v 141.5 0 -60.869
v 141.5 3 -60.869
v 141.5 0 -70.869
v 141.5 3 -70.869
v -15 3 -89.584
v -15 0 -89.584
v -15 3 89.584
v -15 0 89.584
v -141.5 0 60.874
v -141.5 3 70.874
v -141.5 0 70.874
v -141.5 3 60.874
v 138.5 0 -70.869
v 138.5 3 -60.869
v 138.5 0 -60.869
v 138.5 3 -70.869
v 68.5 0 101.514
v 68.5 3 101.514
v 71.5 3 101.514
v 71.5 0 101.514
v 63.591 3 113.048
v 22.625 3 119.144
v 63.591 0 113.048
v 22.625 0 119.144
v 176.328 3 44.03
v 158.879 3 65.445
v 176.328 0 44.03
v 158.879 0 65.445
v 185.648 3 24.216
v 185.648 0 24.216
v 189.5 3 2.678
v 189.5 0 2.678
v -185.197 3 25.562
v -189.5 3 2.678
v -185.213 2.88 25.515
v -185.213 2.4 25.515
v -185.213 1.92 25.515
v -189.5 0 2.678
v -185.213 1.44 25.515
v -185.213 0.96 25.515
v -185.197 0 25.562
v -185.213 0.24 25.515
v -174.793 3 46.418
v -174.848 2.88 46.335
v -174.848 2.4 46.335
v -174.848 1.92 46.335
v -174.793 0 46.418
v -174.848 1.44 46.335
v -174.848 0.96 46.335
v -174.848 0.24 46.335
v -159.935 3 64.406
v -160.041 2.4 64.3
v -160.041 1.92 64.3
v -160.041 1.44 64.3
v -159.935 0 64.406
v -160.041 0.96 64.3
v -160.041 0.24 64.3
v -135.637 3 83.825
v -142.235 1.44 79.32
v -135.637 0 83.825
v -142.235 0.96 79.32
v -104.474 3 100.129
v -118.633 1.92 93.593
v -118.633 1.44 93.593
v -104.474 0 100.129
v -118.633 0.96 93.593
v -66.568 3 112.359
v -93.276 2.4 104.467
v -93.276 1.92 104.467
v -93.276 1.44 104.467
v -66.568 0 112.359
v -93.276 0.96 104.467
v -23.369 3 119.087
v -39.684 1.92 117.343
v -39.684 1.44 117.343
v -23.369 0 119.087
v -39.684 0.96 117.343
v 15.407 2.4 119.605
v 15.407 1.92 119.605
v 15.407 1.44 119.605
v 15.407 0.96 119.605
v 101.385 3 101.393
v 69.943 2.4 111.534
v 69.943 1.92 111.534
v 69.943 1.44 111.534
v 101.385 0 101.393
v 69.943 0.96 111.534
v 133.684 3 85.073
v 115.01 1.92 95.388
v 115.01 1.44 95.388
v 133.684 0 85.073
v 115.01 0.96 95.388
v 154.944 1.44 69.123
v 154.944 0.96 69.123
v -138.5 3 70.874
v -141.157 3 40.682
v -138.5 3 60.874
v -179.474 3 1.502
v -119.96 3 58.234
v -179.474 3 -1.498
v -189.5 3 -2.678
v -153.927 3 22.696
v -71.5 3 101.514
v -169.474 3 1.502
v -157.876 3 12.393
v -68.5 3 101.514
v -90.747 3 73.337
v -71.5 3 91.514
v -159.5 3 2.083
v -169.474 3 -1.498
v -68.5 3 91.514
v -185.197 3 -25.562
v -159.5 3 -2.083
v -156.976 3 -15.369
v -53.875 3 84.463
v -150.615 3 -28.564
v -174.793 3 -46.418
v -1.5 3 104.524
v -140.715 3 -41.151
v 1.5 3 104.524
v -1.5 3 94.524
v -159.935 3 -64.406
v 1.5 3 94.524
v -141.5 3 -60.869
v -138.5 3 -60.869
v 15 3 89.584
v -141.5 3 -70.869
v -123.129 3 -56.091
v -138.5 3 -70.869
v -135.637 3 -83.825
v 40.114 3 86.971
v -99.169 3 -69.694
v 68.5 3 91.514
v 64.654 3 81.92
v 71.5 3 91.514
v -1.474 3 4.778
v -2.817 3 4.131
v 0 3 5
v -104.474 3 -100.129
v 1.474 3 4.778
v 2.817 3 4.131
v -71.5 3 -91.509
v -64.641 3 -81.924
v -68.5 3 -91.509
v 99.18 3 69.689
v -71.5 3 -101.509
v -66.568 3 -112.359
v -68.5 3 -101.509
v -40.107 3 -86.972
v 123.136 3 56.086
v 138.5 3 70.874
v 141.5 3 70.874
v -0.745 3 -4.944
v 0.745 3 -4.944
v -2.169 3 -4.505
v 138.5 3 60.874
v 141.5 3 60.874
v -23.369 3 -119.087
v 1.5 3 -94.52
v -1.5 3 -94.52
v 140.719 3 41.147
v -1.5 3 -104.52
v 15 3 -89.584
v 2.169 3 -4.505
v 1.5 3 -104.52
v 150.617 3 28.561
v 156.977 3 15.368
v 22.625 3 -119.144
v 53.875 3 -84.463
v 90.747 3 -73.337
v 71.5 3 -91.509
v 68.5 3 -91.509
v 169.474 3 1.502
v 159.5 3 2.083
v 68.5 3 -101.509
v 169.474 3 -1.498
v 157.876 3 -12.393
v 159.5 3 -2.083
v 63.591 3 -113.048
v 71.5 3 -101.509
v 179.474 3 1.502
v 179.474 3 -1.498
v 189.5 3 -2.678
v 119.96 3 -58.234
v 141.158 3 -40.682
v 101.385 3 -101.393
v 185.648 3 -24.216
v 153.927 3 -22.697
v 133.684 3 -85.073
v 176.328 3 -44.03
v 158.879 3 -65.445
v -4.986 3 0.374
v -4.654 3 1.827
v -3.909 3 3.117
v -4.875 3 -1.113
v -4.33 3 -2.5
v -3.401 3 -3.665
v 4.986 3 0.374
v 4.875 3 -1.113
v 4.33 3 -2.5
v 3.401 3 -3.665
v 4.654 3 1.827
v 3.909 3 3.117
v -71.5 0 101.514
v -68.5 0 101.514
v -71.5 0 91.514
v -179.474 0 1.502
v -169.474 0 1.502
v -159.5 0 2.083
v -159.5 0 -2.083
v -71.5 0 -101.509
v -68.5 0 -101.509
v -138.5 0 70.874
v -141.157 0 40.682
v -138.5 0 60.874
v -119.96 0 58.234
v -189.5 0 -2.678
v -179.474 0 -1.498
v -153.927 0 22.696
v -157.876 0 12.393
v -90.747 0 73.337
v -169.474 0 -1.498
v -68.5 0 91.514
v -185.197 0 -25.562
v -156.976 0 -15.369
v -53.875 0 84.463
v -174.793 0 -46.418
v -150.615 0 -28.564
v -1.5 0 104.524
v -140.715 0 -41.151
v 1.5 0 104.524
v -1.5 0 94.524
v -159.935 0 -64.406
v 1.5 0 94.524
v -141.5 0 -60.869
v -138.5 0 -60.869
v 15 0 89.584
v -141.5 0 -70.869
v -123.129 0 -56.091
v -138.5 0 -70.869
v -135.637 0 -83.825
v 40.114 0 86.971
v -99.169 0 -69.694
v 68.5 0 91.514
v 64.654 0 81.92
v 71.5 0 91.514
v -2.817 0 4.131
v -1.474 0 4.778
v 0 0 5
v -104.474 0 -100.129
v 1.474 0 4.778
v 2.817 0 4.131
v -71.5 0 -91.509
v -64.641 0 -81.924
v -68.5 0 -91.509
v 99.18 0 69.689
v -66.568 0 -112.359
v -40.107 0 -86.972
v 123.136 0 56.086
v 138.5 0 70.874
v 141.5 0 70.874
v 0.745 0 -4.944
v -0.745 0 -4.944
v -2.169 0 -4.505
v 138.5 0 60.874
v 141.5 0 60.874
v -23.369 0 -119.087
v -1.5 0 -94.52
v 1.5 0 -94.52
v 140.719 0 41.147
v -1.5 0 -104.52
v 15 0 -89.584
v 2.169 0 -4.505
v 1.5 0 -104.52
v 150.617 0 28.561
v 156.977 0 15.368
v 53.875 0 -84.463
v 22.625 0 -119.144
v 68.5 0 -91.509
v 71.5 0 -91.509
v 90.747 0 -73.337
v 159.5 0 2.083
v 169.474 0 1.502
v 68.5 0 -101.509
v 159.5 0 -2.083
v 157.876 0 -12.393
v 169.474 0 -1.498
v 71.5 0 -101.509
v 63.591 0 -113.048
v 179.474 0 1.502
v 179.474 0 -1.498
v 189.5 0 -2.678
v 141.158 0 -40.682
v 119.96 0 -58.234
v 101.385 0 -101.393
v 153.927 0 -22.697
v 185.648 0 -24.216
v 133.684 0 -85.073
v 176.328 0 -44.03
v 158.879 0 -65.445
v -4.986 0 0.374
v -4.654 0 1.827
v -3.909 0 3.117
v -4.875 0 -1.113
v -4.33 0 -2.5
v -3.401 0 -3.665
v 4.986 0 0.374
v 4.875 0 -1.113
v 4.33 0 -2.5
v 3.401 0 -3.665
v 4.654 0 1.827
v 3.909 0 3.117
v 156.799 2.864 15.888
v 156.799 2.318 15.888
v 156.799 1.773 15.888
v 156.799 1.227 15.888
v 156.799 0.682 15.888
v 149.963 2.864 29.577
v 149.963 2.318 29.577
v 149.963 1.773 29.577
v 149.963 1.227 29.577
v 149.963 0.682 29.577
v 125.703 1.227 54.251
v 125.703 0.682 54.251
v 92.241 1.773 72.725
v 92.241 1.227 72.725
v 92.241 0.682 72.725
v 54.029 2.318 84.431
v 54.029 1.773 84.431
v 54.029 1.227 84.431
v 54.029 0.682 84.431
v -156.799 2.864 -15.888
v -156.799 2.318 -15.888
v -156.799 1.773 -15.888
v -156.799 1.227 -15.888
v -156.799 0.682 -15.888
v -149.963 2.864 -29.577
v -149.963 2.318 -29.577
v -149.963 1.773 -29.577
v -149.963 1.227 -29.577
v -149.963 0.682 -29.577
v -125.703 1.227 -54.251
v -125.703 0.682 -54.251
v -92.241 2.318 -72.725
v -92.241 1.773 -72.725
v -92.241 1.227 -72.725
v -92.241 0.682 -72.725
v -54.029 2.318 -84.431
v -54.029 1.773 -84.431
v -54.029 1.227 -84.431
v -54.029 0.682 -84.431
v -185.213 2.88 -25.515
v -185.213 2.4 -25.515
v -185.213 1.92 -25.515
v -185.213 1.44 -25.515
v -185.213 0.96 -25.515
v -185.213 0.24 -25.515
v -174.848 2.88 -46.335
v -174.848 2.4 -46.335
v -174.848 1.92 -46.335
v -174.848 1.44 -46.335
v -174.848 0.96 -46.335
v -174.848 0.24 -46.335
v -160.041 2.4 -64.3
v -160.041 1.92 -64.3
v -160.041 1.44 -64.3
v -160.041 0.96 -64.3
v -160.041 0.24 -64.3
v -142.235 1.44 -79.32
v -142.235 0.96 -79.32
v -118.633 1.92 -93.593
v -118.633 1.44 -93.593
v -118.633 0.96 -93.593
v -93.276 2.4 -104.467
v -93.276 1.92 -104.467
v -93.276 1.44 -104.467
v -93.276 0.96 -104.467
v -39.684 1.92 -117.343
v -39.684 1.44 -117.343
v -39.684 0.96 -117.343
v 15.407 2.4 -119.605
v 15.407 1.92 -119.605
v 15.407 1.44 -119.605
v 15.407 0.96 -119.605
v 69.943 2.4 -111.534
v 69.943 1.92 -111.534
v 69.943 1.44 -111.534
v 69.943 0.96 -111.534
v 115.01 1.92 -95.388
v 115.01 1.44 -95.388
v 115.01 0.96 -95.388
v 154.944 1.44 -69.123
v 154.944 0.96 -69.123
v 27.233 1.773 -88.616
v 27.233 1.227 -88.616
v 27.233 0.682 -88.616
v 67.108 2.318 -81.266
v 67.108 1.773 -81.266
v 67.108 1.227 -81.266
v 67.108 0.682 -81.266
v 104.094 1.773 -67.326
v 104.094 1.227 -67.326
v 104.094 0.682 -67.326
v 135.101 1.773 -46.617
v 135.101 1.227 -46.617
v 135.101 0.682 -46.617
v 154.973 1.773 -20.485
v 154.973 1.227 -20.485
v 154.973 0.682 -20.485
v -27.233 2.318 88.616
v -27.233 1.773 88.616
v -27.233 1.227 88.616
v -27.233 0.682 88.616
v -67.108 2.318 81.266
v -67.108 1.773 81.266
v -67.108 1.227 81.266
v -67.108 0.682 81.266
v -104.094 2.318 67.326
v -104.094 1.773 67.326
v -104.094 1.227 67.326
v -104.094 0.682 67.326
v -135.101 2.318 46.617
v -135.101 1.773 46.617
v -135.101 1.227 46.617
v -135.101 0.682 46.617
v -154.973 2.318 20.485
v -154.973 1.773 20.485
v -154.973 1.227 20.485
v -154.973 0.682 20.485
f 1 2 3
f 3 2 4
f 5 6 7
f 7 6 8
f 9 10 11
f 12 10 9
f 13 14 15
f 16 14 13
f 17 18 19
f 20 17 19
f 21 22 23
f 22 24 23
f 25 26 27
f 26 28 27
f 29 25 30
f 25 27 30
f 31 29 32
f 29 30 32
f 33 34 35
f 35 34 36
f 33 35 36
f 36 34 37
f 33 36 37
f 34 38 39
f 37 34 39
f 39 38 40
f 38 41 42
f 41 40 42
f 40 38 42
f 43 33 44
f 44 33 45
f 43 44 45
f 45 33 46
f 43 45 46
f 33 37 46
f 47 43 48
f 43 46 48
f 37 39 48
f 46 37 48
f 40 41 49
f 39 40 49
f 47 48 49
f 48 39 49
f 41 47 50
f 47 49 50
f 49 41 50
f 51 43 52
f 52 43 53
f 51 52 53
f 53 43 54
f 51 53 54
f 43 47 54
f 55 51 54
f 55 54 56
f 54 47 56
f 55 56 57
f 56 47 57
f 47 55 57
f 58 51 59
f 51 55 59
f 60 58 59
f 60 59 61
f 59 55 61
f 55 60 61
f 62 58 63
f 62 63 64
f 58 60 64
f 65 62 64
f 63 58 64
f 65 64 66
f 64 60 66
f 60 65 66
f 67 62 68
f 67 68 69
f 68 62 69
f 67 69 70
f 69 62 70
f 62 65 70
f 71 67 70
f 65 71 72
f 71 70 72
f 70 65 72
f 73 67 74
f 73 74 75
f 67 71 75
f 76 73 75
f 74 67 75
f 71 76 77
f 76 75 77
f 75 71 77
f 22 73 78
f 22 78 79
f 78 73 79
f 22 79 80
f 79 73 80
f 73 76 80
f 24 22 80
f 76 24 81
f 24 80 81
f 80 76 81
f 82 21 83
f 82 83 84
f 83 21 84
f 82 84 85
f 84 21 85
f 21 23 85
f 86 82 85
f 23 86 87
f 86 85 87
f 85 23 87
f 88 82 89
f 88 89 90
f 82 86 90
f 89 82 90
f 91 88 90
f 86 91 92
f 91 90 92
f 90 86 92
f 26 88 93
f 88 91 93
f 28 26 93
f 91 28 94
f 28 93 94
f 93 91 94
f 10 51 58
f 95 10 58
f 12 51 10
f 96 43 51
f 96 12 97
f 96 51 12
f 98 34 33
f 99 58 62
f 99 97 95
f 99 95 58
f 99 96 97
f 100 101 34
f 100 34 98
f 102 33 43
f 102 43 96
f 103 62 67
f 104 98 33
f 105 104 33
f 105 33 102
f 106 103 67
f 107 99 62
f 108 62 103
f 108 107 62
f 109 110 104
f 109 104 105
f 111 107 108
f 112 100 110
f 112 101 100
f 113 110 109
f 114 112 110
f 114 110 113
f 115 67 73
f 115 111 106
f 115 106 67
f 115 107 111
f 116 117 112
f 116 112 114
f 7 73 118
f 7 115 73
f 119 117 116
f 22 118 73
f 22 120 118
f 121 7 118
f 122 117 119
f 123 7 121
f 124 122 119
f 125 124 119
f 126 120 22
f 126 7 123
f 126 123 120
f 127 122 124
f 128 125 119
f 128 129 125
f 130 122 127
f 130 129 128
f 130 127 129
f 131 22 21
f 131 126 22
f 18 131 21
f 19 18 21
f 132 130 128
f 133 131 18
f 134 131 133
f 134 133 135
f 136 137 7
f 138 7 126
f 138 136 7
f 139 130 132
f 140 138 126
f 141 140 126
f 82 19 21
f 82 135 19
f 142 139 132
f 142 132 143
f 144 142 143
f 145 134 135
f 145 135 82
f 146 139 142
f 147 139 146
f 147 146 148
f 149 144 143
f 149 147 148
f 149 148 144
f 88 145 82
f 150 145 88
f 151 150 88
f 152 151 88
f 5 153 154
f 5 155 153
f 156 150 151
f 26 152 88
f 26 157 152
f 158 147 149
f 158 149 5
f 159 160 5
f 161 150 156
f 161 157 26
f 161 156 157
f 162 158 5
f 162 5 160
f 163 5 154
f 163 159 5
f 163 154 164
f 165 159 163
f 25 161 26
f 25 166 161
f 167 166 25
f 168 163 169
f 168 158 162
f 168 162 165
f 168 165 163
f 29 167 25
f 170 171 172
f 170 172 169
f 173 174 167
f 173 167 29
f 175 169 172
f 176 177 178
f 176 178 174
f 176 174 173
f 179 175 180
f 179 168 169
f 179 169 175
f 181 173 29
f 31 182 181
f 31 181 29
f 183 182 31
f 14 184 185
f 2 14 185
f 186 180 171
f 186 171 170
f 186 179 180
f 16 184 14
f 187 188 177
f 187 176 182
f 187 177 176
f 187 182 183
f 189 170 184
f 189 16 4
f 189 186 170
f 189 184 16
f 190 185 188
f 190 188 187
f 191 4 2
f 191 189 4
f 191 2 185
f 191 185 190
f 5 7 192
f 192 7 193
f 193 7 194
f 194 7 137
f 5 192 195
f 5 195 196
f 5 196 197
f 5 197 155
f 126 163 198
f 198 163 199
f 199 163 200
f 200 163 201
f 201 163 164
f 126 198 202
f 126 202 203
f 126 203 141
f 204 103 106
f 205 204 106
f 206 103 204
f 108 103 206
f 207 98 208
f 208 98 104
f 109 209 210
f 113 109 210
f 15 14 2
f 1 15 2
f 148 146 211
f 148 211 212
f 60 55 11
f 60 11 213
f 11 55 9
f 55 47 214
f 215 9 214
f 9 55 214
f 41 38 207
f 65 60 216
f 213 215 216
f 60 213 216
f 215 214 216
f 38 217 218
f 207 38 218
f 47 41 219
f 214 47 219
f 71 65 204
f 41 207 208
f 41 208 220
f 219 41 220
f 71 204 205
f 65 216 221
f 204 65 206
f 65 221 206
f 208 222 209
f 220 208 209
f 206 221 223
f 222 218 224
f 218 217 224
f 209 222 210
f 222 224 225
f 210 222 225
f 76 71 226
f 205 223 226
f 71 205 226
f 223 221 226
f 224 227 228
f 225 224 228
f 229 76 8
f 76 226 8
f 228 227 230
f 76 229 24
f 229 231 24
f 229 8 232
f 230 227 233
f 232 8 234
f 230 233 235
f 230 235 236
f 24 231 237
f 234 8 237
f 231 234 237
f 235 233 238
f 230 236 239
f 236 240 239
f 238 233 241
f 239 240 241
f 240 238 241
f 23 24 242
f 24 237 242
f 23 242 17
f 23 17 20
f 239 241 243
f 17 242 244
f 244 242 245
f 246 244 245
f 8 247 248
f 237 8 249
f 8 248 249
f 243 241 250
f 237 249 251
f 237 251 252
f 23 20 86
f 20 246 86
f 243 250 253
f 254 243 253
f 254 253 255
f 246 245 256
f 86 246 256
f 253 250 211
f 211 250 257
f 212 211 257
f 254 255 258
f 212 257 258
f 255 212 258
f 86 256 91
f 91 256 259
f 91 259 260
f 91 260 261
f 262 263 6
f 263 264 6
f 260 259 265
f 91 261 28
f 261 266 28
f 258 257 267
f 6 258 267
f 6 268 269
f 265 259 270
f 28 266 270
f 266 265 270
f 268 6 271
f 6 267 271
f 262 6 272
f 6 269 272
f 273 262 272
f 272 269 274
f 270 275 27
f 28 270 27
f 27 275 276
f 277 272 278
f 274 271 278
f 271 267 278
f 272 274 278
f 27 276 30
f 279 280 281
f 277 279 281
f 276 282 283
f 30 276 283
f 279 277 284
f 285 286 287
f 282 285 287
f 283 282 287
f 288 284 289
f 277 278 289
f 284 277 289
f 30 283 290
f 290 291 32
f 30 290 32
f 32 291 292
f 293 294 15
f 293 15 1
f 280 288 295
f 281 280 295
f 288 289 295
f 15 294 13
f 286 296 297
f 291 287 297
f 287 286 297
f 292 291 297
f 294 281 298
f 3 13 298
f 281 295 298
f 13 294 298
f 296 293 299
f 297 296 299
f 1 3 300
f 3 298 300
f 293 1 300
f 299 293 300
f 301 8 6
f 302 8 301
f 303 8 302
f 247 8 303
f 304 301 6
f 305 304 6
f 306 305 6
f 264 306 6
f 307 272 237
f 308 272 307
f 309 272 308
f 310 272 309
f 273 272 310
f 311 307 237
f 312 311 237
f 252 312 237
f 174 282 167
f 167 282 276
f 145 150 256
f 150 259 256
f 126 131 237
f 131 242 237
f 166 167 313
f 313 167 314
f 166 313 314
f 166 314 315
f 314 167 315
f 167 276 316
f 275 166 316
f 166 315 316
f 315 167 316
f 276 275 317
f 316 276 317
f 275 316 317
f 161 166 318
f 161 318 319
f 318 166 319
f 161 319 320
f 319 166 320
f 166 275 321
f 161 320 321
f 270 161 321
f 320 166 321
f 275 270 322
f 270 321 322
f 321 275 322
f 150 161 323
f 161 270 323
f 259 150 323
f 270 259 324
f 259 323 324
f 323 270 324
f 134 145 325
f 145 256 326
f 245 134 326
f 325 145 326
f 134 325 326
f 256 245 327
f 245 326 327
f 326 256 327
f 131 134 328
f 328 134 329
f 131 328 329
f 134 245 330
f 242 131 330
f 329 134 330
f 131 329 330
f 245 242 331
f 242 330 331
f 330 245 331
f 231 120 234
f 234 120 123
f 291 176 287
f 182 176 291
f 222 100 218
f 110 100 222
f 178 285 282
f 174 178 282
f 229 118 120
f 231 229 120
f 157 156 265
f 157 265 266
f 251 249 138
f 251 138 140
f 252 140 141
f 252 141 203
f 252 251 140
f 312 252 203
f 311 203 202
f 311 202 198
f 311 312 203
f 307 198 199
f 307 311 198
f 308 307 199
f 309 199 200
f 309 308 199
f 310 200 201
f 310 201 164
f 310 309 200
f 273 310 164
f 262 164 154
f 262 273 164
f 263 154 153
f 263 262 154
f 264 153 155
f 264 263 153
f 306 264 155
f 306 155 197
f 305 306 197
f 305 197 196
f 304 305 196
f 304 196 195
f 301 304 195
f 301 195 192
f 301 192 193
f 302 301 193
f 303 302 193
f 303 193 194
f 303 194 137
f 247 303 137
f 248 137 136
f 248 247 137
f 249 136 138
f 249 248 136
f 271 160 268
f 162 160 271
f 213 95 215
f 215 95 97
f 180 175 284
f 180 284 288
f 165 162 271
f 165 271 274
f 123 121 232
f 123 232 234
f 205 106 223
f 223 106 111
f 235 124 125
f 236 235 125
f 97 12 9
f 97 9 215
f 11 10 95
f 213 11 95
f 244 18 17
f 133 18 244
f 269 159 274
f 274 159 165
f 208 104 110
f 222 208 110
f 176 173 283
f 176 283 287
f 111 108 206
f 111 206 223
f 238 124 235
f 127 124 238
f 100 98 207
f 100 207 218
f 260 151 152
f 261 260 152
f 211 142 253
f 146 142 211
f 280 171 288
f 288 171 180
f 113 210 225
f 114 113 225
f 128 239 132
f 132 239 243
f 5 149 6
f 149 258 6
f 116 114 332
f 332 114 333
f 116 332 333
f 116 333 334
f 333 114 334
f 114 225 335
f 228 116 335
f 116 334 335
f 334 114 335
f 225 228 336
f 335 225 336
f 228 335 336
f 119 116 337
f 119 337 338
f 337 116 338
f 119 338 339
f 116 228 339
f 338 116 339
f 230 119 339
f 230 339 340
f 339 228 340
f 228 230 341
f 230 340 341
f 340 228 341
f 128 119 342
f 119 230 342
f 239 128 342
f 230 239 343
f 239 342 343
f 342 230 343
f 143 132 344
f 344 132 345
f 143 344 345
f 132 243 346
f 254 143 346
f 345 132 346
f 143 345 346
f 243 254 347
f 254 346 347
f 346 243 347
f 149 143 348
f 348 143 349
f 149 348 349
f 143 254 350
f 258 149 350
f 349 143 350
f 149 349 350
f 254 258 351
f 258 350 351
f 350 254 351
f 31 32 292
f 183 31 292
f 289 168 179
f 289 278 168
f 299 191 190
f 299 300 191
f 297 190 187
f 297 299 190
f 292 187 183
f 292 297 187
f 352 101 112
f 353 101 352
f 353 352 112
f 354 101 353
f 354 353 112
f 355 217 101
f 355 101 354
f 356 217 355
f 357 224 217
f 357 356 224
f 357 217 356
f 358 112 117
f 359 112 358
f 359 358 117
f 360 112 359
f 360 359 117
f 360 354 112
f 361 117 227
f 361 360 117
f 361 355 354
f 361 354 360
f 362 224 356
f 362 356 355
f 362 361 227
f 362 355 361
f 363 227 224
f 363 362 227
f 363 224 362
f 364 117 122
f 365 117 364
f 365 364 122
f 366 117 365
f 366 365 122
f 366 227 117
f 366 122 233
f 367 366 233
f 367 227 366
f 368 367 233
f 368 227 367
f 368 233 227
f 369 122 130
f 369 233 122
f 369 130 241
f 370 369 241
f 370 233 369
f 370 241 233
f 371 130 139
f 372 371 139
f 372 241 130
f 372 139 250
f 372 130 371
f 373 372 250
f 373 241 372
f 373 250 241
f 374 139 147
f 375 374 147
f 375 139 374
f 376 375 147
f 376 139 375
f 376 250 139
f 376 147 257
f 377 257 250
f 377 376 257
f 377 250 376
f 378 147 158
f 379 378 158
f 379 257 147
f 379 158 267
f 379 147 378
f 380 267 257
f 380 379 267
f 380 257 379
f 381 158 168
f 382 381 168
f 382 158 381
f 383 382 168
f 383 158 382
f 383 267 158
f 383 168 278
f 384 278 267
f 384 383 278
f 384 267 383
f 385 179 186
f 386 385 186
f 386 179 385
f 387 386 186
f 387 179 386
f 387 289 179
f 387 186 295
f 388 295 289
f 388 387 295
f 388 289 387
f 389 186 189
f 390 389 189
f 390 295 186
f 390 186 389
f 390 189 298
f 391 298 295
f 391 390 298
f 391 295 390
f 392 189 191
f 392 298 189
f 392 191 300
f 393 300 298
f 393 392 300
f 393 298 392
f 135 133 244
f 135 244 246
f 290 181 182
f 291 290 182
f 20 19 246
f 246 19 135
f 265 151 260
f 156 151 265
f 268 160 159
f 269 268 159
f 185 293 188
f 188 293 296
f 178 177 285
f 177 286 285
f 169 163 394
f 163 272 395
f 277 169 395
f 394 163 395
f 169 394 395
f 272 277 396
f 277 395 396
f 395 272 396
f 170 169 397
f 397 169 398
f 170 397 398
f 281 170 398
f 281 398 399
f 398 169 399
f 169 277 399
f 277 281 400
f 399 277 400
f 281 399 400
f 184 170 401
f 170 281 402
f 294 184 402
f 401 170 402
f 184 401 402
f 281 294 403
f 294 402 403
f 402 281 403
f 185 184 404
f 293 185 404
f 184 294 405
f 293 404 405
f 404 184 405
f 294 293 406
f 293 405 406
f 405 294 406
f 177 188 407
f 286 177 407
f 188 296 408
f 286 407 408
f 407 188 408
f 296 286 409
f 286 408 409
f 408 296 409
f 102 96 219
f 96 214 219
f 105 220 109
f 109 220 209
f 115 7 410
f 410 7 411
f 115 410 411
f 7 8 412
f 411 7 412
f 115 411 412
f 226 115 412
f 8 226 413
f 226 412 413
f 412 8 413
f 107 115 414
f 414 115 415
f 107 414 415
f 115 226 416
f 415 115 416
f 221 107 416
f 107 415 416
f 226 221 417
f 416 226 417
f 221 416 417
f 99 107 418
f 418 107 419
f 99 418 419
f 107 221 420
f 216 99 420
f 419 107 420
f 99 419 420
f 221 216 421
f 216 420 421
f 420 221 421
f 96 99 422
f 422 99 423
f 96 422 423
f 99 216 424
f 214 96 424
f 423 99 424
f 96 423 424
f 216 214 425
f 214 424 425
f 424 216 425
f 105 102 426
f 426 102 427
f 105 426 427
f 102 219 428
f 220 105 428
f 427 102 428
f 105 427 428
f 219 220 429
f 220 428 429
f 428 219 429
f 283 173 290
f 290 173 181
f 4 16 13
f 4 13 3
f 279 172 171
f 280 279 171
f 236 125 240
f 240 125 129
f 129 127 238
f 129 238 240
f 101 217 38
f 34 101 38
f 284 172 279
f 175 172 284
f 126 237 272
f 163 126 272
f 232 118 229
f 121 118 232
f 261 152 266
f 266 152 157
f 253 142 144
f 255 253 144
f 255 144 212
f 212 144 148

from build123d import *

# Parameters (mm, degrees)
SKETCH_1_R          = 5
EXTRUDE_1_DEPTH     = 3
SKETCH_2_W          = 3
SKETCH_2_H          = 10
SKETCH_2_W_2        = 10
SKETCH_2_H_2        = 3
CUT_EXTRUDE_1_DEPTH = 225.320807502


with BuildPart() as part:
    # 草图1 → 凸台-拉伸1 (new body)
    # profile 1 of 2: a face of its own
    with BuildSketch(Plane(origin=(0, 0, 0), x_dir=(1, 0, 0), z_dir=(0, 1, 0))):
        with BuildLine():
            Line((-189.5, 2.67807522), (-189.5, -2.67807522))
            add(Edge.make_bspline(
                [(-189.5, -2.67807522), (-189.403013737, -5.4287659), (-188.913529521, -11.280436832), (-187.184797767, -20.477000703), (-182.901604371, -32.558534689), (-176.518140993, -44.473382271), (-168.370672682, -55.661029172), (-158.816512899, -65.937496211), (-145.622389947, -77.408485785), (-128.233359888, -89.122185343), (-106.405311843, -100.093014988), (-80.328404186, -109.345622083), (-53.415456511, -115.716654886), (-26.01245021, -119.406694681), (1.612249886, -120.52669773), (29.223526803, -119.1102282), (56.584216313, -115.114894197), (83.419619157, -108.420073225), (109.201033267, -98.876697436), (130.527468144, -87.756954706), (147.425203381, -76.001107817), (160.172847856, -64.598888808), (169.450747209, -54.337956503), (177.420154922, -43.019542435), (183.422267467, -31.306804293), (187.385215446, -19.571139093), (188.958191111, -10.7853005), (189.405454524, -5.359541143), (189.5, -2.67807522)],
                knots=[0, 0, 0, 0, 0, 0.022605252, 0.048189512, 0.076525509, 0.104866865, 0.133209133, 0.161552255, 0.191528088, 0.248214577, 0.304901251, 0.361587924, 0.418274582, 0.474961249, 0.531647919, 0.588334591, 0.645021247, 0.701707888, 0.758394507, 0.813600526, 0.841943986, 0.87028688, 0.898629863, 0.926970611, 0.955317967, 0.977963639, 1, 1, 1, 1, 1], degree=4))
            Line((189.5, -2.67807522), (189.5, 2.67807522))
            add(Edge.make_bspline(
                [(-189.5, 2.67807522), (-189.403013737, 5.4287659), (-188.913529521, 11.280436832), (-187.184797767, 20.477000703), (-182.901604371, 32.558534689), (-176.518140993, 44.473382271), (-168.370672682, 55.661029172), (-158.816512899, 65.937496211), (-145.622389947, 77.408485785), (-128.233359888, 89.122185343), (-106.405311843, 100.093014988), (-80.328404186, 109.345622083), (-53.415456511, 115.716654886), (-26.01245021, 119.406694681), (1.612249886, 120.52669773), (29.223526803, 119.1102282), (56.584216313, 115.114894197), (83.419619157, 108.420073225), (109.201033267, 98.876697436), (130.527468144, 87.756954706), (147.425203381, 76.001107817), (160.172847856, 64.598888808), (169.450747209, 54.337956503), (177.420154922, 43.019542435), (183.422267467, 31.306804293), (187.385215446, 19.571139093), (188.958191111, 10.7853005), (189.405454524, 5.359541143), (189.5, 2.67807522)],
                knots=[0, 0, 0, 0, 0, 0.022605252, 0.048189512, 0.076525509, 0.104866865, 0.133209133, 0.161552255, 0.191528088, 0.248214577, 0.304901251, 0.361587924, 0.418274582, 0.474961249, 0.531647919, 0.588334591, 0.645021247, 0.701707888, 0.758394507, 0.813600526, 0.841943986, 0.87028688, 0.898629863, 0.926970611, 0.955317967, 0.977963639, 1, 1, 1, 1, 1], degree=4))
        make_face()
        with BuildLine():
            Line((159.5, 2.083418932), (159.5, -2.083418932))
            add(Edge.make_bspline(
                [(159.5, -2.083418932), (159.430377933, -3.619846345), (159.139385215, -6.671456978), (157.940786615, -12.816015531), (155.280316673, -20.500519912), (150.2464343, -29.63014035), (141.267593425, -41.375851732), (126.3637498, -54.741405415), (104.515298354, -67.83687478), (80.138153839, -77.866087876), (54.182309112, -84.909390201), (27.304092868, -89.081582998), (-2.6913e-05, -90.462801356), (-27.304083634, -89.081576827), (-54.182312778, -84.909404424), (-80.138151247, -77.866066645), (-104.515130919, -67.836936962), (-126.363664513, -54.74153076), (-141.267763099, -41.375581268), (-150.246208112, -29.630491802), (-155.280421928, -20.500291974), (-157.940686294, -12.816236482), (-159.139431477, -6.671261076), (-159.43038084, -3.619814978), (-159.5, -2.083423638)],
                knots=[0.001568685, 0.001568685, 0.001568685, 0.001568685, 0.017144663, 0.03272064, 0.063872596, 0.095024552, 0.126176507, 0.188480419, 0.25078433, 0.313088241, 0.375392153, 0.437696064, 0.499999976, 0.562303887, 0.624607798, 0.68691171, 0.749215621, 0.811519532, 0.873823444, 0.904975399, 0.936127355, 0.967279311, 0.982855289, 0.998431266, 0.998431266, 0.998431266, 0.998431266], degree=3))
            Line((-159.5, -2.083423638), (-159.5, 2.083423638))
            add(Edge.make_bspline(
                [(-159.5, 2.083423638), (-159.43038084, 3.619814978), (-159.139431477, 6.671261076), (-157.940686294, 12.816236482), (-155.280421928, 20.500291974), (-150.246208112, 29.630491802), (-141.267763099, 41.375581268), (-126.363664513, 54.74153076), (-104.515130919, 67.836936962), (-80.138151247, 77.866066645), (-54.182312778, 84.909404424), (-27.304083634, 89.081576827), (-2.6913e-05, 90.462801356), (27.304092868, 89.081582998), (54.182309112, 84.909390201), (80.138153839, 77.866087876), (104.515298354, 67.83687478), (126.3637498, 54.741405415), (141.267593425, 41.375851732), (150.2464343, 29.63014035), (155.280316673, 20.500519912), (157.940786615, 12.816015531), (159.139385215, 6.671456978), (159.430377933, 3.619846345), (159.5, 2.083418932)],
                knots=[0.001568685, 0.001568685, 0.001568685, 0.001568685, 0.017144663, 0.03272064, 0.063872596, 0.095024552, 0.126176507, 0.188480419, 0.25078433, 0.313088241, 0.375392153, 0.437696064, 0.499999976, 0.562303887, 0.624607798, 0.68691171, 0.749215621, 0.811519532, 0.873823444, 0.904975399, 0.936127355, 0.967279311, 0.982855289, 0.998431266, 0.998431266, 0.998431266, 0.998431266], degree=3))
        make_face(mode=Mode.SUBTRACT)
    # profile 2 of 2: a face of its own
    with BuildSketch(Plane(origin=(0, 0, 0), x_dir=(1, 0, 0), z_dir=(0, 1, 0))):
        with BuildLine():
            Line((15, -89.584088933), (15, 89.584088933))
            add(Edge.make_bspline(
                [(-15, 89.584087357), (-10.007870789, 89.863221211), (-1.3117e-05, 90.141566253), (10.007857262, 89.863223114), (15, 89.584088933)],
                knots=[0.465745288, 0.465745288, 0.465745288, 0.465745288, 0.499999976, 0.534254707, 0.534254707, 0.534254707, 0.534254707], degree=3))
            Line((-15, 89.584087357), (-15, -89.584087357))
            add(Edge.make_bspline(
                [(15, -89.584088933), (10.007857262, -89.863223114), (-1.3117e-05, -90.141566253), (-10.007870789, -89.863221211), (-15, -89.584087357)],
                knots=[0.465745244, 0.465745244, 0.465745244, 0.465745244, 0.499999976, 0.534254663, 0.534254663, 0.534254663, 0.534254663], degree=3))
        make_face()
        with Locations(Location((0, 0, 0), (0, 0, 270))):
            Circle(SKETCH_1_R, mode=Mode.SUBTRACT)
    extrude(amount=EXTRUDE_1_DEPTH)

    # 草图2 → 切除-拉伸1 (cut, through all)
    with BuildSketch(Plane(origin=(0, 3, 0), x_dir=(1, 0, 0), z_dir=(0, 1, 0))):
        with Locations((140, -65.874036058)):
            Rectangle(SKETCH_2_W, SKETCH_2_H)
        with Locations((174.473517333, -0.002394208)):
            Rectangle(SKETCH_2_W_2, SKETCH_2_H_2)
        with Locations((140, 65.869247642)):
            Rectangle(SKETCH_2_W, SKETCH_2_H)
        with Locations((70, -96.514031923)):
            Rectangle(SKETCH_2_W, SKETCH_2_H)
        with Locations((70, 96.509243508)):
            Rectangle(SKETCH_2_W, SKETCH_2_H)
        with Locations((0, 99.519533663)):
            Rectangle(SKETCH_2_W, SKETCH_2_H)
        with Locations((0, -99.524322078)):
            Rectangle(SKETCH_2_W, SKETCH_2_H)
        with Locations((-70, -96.514031923)):
            Rectangle(SKETCH_2_W, SKETCH_2_H)
        with Locations((-140, -65.874036058)):
            Rectangle(SKETCH_2_W, SKETCH_2_H)
        with Locations((-174.473517333, -0.002394208)):
            Rectangle(SKETCH_2_W_2, SKETCH_2_H_2)
        with Locations((-140, 65.869247642)):
            Rectangle(SKETCH_2_W, SKETCH_2_H)
        with Locations((-70, 96.509243508)):
            Rectangle(SKETCH_2_W, SKETCH_2_H)
    extrude(amount=-CUT_EXTRUDE_1_DEPTH, mode=Mode.SUBTRACT)


solid = part.part
